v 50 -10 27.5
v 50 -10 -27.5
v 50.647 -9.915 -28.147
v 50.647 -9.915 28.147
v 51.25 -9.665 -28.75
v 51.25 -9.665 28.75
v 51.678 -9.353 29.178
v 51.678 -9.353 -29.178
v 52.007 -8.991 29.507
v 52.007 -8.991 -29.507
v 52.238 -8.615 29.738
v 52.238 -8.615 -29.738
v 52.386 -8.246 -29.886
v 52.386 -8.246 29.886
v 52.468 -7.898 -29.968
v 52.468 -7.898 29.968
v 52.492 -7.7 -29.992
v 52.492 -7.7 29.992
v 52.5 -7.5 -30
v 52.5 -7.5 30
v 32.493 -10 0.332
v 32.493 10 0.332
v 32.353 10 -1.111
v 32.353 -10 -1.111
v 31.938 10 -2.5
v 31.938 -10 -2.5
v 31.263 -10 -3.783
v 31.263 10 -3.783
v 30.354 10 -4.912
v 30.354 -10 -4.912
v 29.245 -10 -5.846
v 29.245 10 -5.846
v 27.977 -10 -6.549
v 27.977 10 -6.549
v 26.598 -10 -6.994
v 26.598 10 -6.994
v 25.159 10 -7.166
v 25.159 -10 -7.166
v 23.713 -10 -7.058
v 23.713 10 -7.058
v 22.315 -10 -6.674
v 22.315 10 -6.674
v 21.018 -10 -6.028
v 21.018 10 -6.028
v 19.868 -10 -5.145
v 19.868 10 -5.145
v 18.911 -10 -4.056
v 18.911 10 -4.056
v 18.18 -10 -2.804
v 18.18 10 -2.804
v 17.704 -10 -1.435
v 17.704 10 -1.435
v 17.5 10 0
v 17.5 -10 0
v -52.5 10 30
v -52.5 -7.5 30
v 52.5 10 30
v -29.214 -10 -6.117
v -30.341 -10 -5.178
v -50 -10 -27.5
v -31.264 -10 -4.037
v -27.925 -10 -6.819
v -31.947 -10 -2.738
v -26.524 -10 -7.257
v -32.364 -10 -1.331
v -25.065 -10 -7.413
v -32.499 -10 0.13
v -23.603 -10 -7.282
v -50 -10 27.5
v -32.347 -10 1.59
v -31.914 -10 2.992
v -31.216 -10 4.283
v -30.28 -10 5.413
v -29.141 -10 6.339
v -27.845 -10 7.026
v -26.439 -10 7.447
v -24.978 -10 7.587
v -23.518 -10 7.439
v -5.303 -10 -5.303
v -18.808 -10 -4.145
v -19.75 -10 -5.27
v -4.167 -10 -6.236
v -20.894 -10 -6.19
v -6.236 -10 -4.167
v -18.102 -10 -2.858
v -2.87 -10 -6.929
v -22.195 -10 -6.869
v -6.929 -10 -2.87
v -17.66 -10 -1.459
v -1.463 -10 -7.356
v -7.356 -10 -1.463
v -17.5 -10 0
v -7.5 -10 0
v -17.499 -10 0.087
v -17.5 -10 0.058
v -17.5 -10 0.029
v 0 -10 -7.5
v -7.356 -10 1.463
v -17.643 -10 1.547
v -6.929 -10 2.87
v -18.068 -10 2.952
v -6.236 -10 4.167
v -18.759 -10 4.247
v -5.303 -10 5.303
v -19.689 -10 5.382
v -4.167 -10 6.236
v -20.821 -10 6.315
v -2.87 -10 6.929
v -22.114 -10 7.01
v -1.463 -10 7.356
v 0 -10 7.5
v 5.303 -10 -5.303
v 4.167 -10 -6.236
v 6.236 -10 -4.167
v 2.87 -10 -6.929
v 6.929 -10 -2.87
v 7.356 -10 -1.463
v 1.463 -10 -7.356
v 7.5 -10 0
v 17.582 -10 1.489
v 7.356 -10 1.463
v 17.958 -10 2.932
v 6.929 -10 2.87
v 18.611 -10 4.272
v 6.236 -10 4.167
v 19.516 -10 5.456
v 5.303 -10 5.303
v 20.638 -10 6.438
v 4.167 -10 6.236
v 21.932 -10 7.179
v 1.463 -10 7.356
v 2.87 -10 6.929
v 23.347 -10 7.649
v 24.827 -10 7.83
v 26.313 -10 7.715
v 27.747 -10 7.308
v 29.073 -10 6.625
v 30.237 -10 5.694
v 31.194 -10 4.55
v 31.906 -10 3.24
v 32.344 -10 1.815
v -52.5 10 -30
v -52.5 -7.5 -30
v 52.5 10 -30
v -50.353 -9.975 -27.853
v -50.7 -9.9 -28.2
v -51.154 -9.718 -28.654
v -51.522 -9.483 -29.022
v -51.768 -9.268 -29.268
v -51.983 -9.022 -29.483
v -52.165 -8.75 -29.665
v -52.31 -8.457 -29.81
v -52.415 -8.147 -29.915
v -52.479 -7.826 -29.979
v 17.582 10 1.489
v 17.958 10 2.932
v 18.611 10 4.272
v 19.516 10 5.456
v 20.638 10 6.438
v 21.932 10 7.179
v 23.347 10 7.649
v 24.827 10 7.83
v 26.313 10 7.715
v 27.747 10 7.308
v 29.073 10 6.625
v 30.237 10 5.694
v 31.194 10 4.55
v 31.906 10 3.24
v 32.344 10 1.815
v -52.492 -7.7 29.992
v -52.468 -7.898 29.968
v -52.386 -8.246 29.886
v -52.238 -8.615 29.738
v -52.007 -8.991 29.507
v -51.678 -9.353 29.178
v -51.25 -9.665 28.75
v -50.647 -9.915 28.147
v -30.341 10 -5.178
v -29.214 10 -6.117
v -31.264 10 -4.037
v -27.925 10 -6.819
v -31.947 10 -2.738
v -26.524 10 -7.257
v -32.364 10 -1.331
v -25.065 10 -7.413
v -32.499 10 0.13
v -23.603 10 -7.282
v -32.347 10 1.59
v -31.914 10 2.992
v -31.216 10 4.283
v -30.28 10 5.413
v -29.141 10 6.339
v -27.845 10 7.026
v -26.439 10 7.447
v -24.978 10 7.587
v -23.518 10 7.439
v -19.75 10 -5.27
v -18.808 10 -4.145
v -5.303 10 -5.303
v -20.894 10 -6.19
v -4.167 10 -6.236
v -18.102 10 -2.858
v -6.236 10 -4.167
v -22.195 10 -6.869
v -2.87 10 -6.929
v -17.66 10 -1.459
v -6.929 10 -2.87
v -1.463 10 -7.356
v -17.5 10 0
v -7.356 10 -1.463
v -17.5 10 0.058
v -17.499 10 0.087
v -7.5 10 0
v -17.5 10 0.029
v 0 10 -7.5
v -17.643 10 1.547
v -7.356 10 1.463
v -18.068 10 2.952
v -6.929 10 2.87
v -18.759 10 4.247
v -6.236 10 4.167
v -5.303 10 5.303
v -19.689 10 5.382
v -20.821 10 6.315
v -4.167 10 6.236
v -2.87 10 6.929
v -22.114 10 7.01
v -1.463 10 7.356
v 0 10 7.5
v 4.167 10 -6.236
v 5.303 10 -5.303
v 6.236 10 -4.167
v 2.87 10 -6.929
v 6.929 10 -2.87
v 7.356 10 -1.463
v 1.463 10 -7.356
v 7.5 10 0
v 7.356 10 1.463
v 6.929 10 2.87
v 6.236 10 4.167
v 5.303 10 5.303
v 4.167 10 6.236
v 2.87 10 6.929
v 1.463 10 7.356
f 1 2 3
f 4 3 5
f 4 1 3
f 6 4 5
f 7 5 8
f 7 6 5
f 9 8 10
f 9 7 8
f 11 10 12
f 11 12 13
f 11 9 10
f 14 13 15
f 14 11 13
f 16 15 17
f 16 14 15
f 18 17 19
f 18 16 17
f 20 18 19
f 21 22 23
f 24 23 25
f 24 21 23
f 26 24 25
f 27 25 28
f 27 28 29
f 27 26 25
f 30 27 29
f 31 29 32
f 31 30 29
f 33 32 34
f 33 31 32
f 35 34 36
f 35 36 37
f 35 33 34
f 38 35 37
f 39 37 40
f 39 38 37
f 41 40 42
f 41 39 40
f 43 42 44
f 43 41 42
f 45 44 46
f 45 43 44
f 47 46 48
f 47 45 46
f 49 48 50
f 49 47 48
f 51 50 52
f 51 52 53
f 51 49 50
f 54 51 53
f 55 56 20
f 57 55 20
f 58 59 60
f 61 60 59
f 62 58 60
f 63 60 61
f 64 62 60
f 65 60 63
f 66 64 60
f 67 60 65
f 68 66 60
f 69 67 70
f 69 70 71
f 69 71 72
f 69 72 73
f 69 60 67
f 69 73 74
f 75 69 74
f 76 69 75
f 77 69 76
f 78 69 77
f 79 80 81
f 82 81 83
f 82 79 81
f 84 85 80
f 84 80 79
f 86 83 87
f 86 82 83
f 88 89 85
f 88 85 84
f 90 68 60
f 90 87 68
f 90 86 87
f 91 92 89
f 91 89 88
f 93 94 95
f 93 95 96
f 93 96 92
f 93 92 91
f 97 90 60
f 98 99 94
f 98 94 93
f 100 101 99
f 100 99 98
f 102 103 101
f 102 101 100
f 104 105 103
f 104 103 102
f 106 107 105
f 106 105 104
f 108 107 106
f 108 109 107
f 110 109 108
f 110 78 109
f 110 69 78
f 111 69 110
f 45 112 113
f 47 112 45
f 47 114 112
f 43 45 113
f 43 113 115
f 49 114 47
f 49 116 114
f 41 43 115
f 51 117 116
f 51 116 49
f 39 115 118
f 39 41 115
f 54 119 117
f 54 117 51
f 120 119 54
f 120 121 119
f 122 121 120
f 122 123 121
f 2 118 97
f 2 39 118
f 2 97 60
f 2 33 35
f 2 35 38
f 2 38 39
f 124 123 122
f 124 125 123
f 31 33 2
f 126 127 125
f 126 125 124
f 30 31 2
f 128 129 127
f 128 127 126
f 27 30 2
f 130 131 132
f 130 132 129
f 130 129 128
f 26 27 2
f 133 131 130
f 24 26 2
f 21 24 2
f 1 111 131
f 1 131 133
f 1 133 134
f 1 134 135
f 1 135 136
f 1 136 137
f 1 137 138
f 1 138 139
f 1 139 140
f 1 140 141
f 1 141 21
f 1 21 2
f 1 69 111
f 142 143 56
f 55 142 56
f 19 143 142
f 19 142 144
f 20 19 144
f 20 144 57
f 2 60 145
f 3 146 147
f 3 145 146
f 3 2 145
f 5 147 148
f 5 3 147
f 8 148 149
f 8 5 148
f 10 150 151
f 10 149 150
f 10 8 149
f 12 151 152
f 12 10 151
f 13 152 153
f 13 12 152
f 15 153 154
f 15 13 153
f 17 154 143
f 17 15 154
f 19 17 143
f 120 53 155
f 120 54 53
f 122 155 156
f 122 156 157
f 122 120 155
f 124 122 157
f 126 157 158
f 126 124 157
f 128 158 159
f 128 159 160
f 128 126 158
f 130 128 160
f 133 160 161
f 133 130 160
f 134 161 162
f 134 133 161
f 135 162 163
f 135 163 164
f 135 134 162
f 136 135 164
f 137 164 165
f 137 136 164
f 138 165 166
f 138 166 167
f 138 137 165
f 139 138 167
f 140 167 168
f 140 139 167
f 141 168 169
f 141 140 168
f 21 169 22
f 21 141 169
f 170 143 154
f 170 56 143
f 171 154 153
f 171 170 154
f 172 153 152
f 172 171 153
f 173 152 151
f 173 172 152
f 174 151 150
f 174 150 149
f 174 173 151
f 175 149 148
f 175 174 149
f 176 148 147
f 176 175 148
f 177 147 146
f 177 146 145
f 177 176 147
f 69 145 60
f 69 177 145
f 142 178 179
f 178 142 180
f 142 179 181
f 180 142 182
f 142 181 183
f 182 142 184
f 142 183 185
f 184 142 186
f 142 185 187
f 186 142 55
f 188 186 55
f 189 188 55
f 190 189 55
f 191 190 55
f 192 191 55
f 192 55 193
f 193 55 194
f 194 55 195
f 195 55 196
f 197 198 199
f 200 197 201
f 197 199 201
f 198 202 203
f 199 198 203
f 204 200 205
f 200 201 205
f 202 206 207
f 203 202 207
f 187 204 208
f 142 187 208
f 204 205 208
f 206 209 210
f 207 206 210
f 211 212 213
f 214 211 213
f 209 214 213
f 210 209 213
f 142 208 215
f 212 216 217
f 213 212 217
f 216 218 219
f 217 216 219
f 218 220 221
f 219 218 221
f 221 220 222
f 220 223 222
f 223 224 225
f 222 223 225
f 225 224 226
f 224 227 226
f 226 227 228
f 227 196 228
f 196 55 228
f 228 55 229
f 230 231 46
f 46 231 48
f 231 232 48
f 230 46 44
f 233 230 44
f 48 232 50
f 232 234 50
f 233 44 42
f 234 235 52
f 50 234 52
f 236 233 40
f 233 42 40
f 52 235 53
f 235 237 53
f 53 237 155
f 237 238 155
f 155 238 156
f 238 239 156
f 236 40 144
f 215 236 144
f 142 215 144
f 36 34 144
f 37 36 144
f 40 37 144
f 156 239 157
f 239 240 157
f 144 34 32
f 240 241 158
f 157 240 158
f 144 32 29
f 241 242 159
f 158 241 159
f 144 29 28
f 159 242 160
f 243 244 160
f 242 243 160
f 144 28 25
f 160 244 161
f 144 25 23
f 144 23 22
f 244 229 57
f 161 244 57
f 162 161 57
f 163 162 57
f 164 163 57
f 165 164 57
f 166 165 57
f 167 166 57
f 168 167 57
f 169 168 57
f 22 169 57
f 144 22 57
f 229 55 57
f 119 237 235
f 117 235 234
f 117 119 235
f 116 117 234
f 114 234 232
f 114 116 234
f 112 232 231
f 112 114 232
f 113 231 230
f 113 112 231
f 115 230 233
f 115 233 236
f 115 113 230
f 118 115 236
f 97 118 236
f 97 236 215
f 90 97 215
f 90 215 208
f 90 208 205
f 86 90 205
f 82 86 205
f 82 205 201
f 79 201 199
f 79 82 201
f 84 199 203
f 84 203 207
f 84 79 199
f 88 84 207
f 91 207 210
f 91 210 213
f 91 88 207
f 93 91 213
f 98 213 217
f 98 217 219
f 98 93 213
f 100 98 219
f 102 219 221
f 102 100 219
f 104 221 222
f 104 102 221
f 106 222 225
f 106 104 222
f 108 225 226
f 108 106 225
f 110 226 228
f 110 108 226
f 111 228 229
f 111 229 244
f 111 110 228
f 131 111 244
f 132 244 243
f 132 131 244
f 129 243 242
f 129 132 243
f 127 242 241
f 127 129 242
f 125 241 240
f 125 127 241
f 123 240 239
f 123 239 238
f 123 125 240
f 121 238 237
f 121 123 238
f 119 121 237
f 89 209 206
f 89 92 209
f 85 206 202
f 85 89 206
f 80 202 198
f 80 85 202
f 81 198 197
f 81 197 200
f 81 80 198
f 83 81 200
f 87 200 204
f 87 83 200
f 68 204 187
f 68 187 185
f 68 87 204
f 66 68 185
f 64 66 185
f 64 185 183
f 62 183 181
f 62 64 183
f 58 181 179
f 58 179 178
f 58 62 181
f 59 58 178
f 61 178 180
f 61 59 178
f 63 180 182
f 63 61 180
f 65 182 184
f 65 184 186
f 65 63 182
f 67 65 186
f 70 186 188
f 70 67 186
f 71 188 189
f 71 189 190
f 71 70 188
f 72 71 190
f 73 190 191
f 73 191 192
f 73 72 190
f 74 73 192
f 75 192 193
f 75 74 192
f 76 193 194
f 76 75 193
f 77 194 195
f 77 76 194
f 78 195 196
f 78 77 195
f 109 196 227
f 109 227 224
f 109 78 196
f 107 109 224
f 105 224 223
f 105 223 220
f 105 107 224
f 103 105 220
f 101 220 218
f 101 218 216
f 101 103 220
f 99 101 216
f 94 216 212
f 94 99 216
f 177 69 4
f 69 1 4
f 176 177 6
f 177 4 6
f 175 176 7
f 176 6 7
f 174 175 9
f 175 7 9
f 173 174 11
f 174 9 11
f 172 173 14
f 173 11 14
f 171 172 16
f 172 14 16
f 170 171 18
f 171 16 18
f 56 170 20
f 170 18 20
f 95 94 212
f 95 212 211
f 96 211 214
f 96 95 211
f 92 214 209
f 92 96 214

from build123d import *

# Parameters (mm, degrees)
F0_W     = 105
F0_H     = 60
F1_DEPTH = 10
F2_R     = 2.5


with BuildPart() as f1:
    # F0 (on Front) → F1 (new body, symmetric)
    with BuildSketch(Plane.XZ):
        Rectangle(F0_W, F0_H)
        with BuildLine():
            ThreePointArc((-17.499497, 0.086824), (-17.499623, 0.043411), (-17.5, 0))
            ThreePointArc((-17.5, 0), (-32.499372, 0.130237), (-17.499497, 0.086824))
        make_face(mode=Mode.SUBTRACT)
        with BuildLine():
            ThreePointArc((-7.5, 0), (0, 7.5), (7.5, 0))
            ThreePointArc((7.5, 0), (0, -7.5), (-7.5, 0))
        make_face(mode=Mode.SUBTRACT)
        with BuildLine():
            ThreePointArc((32.492652, 0.33191), (25.158648, -7.166253), (17.5, 0))
            ThreePointArc((17.5, 0), (24.826656, 7.830073), (32.492652, 0.33191))
        make_face(mode=Mode.SUBTRACT)
    extrude(amount=F1_DEPTH, both=True)

    # F2
    f2_edges = [f1.edges().sort_by_distance(p)[0] for p in [
        (0, -10, 30),
        (-52.5, -10, 0),
        (0, -10, -30),
        (52.5, -10, 0),
    ]]
    fillet(f2_edges, radius=F2_R)


solid = f1.part
